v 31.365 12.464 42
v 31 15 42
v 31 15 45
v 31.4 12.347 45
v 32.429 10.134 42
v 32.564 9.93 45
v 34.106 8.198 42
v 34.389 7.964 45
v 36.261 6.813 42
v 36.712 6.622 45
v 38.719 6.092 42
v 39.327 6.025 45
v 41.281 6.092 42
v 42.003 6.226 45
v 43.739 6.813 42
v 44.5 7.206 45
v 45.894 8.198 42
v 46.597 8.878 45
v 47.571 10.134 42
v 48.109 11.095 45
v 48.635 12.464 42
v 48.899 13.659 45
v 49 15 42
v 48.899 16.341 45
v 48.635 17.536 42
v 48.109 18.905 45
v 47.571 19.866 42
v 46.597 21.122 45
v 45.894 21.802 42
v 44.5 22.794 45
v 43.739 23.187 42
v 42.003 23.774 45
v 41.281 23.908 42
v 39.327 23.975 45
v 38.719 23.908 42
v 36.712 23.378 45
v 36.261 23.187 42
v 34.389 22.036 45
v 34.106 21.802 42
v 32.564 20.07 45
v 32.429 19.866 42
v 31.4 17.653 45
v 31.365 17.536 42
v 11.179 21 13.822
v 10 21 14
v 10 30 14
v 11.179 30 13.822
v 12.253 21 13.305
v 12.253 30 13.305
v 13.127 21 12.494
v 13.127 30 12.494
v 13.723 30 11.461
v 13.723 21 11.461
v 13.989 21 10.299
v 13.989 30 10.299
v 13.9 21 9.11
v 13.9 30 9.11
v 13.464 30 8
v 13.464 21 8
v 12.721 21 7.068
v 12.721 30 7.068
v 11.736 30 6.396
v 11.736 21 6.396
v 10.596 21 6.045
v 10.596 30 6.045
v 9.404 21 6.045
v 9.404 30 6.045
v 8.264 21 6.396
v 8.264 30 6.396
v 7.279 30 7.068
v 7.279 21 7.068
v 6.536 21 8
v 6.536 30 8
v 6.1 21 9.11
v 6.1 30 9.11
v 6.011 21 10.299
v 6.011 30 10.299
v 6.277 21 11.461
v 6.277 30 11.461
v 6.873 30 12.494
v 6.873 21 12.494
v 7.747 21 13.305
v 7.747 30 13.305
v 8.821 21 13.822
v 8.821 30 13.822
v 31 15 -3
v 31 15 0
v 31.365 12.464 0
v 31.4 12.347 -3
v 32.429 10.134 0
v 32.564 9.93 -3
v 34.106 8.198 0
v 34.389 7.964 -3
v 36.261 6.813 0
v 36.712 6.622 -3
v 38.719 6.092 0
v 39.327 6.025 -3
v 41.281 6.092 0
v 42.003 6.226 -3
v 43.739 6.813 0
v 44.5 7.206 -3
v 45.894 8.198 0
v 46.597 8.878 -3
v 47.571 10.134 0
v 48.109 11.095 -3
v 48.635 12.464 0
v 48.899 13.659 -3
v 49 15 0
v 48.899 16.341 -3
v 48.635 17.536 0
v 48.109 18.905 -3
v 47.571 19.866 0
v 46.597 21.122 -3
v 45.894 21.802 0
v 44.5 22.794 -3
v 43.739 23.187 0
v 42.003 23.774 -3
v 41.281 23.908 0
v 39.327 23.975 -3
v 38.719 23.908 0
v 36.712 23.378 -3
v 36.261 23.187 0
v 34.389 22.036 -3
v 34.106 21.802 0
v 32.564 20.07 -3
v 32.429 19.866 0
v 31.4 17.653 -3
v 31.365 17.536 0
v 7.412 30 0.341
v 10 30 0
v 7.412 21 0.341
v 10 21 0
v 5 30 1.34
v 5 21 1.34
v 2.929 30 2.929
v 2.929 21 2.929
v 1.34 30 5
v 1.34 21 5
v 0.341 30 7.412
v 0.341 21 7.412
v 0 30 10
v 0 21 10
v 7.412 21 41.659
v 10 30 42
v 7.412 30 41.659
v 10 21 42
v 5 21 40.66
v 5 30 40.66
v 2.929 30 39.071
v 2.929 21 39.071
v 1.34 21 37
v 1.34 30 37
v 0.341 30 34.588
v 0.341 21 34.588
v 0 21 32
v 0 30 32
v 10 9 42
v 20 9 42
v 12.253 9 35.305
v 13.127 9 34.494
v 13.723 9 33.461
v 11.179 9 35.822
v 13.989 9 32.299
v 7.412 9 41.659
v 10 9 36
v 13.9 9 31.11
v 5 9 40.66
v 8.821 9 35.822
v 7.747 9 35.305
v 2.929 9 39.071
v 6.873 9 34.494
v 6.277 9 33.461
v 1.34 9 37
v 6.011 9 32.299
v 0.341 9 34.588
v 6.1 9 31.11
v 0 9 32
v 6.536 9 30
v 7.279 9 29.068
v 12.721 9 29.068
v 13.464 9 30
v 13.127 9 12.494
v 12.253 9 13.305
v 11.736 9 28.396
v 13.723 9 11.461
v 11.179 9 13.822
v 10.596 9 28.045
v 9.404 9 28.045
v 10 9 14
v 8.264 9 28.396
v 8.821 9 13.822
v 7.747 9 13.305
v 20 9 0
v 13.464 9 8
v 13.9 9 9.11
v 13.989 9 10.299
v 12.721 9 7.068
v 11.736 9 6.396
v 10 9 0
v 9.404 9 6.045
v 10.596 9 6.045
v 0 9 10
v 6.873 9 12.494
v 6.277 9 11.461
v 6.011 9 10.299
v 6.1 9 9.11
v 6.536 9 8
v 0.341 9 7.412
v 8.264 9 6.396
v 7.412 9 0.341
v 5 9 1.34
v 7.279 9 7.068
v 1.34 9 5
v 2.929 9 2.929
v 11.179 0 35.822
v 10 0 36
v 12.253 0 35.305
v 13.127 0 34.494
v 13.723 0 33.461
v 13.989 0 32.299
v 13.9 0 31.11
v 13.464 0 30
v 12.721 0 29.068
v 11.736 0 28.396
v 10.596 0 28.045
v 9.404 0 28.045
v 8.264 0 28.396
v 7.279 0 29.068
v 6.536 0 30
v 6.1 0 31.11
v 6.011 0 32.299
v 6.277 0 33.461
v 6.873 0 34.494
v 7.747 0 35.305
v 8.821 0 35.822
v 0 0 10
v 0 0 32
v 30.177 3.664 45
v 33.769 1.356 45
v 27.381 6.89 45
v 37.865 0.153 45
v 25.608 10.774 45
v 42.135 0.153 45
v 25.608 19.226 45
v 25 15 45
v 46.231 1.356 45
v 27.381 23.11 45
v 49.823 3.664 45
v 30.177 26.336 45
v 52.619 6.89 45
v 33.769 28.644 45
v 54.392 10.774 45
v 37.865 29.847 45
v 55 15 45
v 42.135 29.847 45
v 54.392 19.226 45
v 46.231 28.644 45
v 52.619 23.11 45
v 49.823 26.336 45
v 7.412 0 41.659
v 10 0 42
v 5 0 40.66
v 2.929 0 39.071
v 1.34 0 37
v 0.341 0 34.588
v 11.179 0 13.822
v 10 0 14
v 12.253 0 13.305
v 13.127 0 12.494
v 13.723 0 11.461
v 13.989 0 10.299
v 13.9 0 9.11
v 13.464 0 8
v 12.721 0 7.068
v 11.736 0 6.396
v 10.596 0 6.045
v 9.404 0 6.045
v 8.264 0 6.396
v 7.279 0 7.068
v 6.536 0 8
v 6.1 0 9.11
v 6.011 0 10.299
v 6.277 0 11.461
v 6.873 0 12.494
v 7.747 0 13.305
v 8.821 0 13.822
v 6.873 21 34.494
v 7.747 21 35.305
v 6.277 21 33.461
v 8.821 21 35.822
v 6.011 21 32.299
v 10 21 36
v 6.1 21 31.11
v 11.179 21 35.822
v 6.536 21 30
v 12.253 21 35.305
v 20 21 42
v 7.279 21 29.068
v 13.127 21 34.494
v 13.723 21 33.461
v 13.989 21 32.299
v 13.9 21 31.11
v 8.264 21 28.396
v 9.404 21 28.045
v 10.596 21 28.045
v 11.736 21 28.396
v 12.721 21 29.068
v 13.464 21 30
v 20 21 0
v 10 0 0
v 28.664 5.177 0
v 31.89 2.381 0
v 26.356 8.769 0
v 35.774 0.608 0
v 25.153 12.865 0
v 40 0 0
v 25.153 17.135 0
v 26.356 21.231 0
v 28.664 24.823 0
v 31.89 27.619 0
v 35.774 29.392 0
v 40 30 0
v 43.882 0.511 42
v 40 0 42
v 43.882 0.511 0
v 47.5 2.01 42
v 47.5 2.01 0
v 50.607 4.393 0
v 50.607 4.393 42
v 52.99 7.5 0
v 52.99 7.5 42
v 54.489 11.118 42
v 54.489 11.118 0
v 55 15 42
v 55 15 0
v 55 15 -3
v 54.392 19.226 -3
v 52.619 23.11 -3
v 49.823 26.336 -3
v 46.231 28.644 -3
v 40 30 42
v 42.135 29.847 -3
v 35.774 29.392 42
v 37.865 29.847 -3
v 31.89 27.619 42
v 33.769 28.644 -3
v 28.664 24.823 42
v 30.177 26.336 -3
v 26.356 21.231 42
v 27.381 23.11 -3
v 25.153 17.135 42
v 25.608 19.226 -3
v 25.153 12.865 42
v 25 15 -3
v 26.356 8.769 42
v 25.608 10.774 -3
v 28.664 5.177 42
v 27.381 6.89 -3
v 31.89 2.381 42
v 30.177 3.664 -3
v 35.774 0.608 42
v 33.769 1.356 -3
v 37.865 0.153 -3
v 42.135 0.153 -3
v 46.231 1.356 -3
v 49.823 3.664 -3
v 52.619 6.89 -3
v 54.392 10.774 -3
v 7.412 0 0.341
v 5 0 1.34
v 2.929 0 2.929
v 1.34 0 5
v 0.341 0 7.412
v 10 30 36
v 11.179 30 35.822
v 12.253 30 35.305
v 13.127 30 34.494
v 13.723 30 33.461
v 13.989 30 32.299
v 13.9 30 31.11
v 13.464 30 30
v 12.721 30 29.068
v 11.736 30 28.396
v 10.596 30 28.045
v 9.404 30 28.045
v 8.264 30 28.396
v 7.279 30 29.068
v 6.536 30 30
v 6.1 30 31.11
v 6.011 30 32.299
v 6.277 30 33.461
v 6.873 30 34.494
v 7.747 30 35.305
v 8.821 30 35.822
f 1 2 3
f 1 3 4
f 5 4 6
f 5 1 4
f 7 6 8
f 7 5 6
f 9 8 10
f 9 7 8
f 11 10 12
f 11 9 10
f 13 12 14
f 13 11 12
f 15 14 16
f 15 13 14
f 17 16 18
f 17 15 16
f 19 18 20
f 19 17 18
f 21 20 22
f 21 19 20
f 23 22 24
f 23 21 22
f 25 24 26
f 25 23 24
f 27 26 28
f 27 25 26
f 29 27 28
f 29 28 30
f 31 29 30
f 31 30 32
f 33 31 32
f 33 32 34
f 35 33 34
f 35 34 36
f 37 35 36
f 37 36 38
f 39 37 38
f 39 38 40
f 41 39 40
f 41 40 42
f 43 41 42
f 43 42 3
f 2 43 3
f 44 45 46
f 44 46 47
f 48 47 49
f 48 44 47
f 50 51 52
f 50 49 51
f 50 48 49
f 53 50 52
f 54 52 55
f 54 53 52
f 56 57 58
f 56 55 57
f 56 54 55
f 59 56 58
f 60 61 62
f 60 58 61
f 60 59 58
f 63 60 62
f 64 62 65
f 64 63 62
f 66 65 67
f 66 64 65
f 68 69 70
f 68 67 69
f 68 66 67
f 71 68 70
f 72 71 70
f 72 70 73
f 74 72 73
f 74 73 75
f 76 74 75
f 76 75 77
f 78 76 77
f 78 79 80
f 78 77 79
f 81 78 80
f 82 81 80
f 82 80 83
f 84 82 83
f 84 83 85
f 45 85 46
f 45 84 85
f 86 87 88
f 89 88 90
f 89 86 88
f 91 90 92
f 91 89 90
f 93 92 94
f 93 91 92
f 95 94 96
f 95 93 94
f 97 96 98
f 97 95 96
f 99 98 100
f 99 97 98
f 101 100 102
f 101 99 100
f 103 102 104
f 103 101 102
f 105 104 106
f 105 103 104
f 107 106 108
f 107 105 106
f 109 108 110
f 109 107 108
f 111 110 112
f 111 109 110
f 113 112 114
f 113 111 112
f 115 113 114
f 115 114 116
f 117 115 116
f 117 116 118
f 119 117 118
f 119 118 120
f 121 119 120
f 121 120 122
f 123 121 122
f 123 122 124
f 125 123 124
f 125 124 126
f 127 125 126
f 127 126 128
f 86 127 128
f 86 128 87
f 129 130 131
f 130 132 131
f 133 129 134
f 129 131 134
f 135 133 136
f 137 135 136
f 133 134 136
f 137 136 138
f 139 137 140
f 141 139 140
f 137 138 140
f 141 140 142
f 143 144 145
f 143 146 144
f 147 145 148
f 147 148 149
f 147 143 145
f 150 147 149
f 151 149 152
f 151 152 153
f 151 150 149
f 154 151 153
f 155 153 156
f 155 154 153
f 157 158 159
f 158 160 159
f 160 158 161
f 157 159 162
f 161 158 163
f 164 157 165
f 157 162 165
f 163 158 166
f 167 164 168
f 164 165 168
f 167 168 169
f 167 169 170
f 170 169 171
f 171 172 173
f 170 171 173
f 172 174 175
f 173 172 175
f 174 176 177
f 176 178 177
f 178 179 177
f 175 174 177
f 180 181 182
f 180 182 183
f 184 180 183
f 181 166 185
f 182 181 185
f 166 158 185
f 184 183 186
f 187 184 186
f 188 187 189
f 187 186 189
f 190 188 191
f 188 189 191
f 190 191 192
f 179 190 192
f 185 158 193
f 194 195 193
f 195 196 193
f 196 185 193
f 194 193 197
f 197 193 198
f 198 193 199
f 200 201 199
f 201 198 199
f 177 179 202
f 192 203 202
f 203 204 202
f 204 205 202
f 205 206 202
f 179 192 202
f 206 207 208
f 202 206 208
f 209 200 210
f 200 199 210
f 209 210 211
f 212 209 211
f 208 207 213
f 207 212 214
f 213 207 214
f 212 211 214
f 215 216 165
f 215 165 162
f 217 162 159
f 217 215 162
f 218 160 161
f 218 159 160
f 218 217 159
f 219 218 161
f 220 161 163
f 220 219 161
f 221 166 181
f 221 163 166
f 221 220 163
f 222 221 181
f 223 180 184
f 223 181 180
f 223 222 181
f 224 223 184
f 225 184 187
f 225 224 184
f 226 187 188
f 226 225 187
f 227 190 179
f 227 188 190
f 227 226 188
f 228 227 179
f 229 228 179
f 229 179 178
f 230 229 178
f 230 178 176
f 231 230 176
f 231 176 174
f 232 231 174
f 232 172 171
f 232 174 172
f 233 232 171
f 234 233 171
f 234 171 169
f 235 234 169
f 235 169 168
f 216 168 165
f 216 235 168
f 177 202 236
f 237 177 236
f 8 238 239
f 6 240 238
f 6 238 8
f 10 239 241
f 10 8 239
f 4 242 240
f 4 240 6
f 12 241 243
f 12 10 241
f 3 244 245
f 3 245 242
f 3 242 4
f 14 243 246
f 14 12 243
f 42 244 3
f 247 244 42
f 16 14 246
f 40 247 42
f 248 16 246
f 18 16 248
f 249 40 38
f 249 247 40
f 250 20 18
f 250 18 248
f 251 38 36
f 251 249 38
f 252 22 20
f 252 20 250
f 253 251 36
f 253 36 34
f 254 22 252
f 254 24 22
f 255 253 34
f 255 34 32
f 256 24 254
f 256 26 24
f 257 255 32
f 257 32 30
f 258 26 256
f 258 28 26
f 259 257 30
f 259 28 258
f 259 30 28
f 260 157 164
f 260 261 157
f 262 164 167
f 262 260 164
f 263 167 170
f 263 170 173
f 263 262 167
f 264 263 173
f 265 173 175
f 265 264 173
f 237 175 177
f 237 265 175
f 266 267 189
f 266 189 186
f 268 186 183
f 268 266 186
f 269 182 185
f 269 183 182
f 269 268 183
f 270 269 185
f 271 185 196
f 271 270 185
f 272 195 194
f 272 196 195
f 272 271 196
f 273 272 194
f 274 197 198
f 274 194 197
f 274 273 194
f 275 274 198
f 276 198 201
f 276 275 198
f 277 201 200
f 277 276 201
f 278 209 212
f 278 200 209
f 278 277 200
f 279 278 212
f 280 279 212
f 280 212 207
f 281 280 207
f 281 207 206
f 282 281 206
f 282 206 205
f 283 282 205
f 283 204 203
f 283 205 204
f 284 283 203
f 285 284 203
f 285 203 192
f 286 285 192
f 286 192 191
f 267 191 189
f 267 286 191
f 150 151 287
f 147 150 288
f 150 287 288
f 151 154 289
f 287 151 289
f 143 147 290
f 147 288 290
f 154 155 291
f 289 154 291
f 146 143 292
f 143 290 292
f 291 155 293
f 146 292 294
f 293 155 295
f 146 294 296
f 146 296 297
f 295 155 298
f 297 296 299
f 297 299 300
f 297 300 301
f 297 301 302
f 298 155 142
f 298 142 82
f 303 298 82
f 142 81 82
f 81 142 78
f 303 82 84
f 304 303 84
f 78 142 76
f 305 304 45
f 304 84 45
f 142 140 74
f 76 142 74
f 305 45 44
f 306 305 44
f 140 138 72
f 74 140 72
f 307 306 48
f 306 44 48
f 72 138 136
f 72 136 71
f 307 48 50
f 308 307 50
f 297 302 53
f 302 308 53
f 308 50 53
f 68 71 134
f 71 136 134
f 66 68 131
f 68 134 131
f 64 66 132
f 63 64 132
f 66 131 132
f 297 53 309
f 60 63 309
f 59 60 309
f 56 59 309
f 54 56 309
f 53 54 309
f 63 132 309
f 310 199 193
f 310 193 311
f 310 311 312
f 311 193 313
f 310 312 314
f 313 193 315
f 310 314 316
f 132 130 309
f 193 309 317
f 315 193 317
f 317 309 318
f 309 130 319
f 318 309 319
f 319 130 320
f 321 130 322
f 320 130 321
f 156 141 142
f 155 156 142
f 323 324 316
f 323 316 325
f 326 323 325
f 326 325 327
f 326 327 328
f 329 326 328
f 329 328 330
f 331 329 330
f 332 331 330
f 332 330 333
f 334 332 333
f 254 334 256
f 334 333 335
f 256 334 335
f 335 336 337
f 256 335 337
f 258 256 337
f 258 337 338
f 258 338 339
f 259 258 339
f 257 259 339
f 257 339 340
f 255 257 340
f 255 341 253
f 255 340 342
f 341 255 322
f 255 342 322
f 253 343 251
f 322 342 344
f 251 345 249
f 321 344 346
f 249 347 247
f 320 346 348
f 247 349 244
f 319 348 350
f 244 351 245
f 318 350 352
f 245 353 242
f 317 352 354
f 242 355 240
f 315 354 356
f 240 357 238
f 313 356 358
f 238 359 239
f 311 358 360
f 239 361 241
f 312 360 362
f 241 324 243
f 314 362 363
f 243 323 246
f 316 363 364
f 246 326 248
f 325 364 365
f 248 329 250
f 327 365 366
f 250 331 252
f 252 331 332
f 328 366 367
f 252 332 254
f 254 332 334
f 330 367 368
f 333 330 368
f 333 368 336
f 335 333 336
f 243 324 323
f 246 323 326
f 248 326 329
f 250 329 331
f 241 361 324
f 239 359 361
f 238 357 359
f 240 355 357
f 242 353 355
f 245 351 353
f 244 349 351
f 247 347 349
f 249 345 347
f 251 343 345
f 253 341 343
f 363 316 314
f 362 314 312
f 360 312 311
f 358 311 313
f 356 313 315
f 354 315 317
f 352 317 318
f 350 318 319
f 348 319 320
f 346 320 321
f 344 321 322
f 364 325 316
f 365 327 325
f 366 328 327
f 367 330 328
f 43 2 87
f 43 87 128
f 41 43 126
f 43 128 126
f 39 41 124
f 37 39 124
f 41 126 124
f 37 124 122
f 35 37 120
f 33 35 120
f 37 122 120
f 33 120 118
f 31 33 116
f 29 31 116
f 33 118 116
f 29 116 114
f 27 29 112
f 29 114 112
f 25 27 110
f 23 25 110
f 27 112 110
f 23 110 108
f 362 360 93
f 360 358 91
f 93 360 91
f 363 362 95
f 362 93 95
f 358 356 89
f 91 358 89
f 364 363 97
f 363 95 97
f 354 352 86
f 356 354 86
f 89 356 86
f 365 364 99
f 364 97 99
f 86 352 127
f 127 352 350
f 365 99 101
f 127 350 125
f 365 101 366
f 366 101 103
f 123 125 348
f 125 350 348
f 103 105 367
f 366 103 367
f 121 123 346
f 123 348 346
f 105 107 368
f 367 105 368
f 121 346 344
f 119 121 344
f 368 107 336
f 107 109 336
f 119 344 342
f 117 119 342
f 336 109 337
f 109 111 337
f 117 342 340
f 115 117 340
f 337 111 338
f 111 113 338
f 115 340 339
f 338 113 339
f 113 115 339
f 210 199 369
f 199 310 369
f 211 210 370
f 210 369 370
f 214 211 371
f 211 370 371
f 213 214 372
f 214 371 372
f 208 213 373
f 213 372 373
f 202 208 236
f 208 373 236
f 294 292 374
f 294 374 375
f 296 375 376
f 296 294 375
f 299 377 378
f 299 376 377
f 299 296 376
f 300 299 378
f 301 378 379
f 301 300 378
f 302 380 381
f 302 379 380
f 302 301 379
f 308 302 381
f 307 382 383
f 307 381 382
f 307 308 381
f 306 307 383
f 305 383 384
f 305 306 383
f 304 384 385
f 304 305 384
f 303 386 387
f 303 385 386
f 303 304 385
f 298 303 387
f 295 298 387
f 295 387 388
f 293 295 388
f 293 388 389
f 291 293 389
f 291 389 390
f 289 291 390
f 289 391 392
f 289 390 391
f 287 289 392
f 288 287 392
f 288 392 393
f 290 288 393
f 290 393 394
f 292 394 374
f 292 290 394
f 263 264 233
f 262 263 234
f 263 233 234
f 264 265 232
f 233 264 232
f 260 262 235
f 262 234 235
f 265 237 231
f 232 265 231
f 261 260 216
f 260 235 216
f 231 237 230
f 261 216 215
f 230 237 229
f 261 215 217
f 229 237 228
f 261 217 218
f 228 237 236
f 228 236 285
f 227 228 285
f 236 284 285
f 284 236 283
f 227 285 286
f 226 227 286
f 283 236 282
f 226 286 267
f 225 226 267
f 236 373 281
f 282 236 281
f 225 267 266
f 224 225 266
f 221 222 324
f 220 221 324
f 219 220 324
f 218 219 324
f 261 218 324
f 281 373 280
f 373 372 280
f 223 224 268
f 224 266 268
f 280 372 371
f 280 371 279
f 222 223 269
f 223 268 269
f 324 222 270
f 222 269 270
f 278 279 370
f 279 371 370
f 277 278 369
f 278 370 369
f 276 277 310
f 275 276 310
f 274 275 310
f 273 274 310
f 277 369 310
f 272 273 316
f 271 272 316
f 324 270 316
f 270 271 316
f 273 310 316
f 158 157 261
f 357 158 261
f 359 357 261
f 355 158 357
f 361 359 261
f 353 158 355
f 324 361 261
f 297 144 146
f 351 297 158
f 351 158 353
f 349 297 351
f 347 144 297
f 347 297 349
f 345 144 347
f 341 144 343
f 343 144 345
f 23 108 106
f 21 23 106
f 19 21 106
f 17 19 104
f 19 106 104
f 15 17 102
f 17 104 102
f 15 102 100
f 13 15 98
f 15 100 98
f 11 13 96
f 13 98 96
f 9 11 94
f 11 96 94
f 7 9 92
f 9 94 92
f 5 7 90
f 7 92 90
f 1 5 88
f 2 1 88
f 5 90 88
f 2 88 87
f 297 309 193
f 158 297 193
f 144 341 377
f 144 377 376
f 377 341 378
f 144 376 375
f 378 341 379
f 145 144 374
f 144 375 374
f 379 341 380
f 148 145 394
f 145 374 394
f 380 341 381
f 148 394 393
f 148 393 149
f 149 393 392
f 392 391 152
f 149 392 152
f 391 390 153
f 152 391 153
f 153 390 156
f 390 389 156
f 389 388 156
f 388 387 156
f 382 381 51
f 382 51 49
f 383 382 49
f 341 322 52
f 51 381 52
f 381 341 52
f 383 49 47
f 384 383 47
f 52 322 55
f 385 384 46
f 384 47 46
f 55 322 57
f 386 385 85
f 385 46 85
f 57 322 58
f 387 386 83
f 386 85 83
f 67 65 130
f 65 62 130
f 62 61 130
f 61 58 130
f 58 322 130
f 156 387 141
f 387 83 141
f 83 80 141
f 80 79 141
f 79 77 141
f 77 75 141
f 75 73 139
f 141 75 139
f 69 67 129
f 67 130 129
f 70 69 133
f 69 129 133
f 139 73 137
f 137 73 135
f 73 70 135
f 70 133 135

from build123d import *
from build123d.topology import SkipClean

# Parameters (mm, degrees)
SKETCH_1_R               = 9
EXTRUDE_1_DEPTH          = 42
EXTRUDE_3_DEPTH          = 3
EXTRUDE_3_DEPTH_BACK     = 45
SKETCH_2_R               = 15
SKETCH_2_R_2             = 9
CUT_EXTRUDE_1_DEPTH      = 78.136243103
CUT_EXTRUDE_1_DEPTH_BACK = 78.136243103
SKETCH_3_R               = 4
CUT_EXTRUDE_2_DEPTH      = 78.136243103
CUT_EXTRUDE_2_DEPTH_BACK = 78.136243103
SKETCH_4_R               = 4
FILLET_5_R               = 10


with BuildPart() as part:
    # 草图1 → 凸台-拉伸1 (new body)
    with BuildSketch(Plane.XY):
        with BuildLine():
            Line((0, 9), (0, 0))
            Line((0, 0), (40, 0))
            ThreePointArc((40, 0), (55, 15), (40, 30))
            Line((40, 30), (0, 30))
            Line((0, 30), (0, 21))
            Line((0, 21), (20, 21))
            Line((20, 21), (20, 9))
            Line((20, 9), (0, 9))
        make_face()
        with Locations((40, 15)):
            Circle(SKETCH_1_R, mode=Mode.SUBTRACT)
    extrude(amount=EXTRUDE_1_DEPTH)

    # 草图2 → 凸台-拉伸3 (add, two sides: drawn at the far end of the back side and taken through both)
    with SkipClean():  # the faces are left unmerged after this step: merging them gives an invalid solid
        with BuildSketch(Plane.XY.offset(42).offset(-EXTRUDE_3_DEPTH_BACK)):
            with Locations((40, 15)):
                Circle(SKETCH_2_R)
            with Locations((40, 15)):
                Circle(SKETCH_2_R_2, mode=Mode.SUBTRACT)
        extrude(amount=EXTRUDE_3_DEPTH + EXTRUDE_3_DEPTH_BACK)
    add(part.part.scale(1), mode=Mode.REPLACE)  # the faces are merged on a copy

    # 草图3 → 切除-拉伸1 (cut, two sides: drawn at the far end of the back side and taken through both)
    with BuildSketch(Plane(origin=(0, 30, 0), x_dir=(1, 0, 0), z_dir=(0, 1, 0)).offset(-CUT_EXTRUDE_1_DEPTH_BACK)):
        with Locations((10, -10)):
            Circle(SKETCH_3_R)
    extrude(amount=CUT_EXTRUDE_1_DEPTH + CUT_EXTRUDE_1_DEPTH_BACK, mode=Mode.SUBTRACT)

    # 草图4 → 切除-拉伸2 (cut, two sides: drawn at the far end of the back side and taken through both)
    with BuildSketch(Plane(origin=(0, 30, 0), x_dir=(1, 0, 0), z_dir=(0, 1, 0)).offset(-CUT_EXTRUDE_2_DEPTH_BACK)):
        with Locations((10, -32)):
            Circle(SKETCH_4_R)
    extrude(amount=CUT_EXTRUDE_2_DEPTH + CUT_EXTRUDE_2_DEPTH_BACK, mode=Mode.SUBTRACT)

    # 圆角5
    fillet_5_edges = [part.edges().sort_by_distance(p)[0] for p in [
        (0, 25.5, 0),
        (0, 4.5, 0),
        (0, 4.5, 42),
        (0, 25.5, 42),
    ]]
    fillet(fillet_5_edges, radius=FILLET_5_R)


solid = part.part
